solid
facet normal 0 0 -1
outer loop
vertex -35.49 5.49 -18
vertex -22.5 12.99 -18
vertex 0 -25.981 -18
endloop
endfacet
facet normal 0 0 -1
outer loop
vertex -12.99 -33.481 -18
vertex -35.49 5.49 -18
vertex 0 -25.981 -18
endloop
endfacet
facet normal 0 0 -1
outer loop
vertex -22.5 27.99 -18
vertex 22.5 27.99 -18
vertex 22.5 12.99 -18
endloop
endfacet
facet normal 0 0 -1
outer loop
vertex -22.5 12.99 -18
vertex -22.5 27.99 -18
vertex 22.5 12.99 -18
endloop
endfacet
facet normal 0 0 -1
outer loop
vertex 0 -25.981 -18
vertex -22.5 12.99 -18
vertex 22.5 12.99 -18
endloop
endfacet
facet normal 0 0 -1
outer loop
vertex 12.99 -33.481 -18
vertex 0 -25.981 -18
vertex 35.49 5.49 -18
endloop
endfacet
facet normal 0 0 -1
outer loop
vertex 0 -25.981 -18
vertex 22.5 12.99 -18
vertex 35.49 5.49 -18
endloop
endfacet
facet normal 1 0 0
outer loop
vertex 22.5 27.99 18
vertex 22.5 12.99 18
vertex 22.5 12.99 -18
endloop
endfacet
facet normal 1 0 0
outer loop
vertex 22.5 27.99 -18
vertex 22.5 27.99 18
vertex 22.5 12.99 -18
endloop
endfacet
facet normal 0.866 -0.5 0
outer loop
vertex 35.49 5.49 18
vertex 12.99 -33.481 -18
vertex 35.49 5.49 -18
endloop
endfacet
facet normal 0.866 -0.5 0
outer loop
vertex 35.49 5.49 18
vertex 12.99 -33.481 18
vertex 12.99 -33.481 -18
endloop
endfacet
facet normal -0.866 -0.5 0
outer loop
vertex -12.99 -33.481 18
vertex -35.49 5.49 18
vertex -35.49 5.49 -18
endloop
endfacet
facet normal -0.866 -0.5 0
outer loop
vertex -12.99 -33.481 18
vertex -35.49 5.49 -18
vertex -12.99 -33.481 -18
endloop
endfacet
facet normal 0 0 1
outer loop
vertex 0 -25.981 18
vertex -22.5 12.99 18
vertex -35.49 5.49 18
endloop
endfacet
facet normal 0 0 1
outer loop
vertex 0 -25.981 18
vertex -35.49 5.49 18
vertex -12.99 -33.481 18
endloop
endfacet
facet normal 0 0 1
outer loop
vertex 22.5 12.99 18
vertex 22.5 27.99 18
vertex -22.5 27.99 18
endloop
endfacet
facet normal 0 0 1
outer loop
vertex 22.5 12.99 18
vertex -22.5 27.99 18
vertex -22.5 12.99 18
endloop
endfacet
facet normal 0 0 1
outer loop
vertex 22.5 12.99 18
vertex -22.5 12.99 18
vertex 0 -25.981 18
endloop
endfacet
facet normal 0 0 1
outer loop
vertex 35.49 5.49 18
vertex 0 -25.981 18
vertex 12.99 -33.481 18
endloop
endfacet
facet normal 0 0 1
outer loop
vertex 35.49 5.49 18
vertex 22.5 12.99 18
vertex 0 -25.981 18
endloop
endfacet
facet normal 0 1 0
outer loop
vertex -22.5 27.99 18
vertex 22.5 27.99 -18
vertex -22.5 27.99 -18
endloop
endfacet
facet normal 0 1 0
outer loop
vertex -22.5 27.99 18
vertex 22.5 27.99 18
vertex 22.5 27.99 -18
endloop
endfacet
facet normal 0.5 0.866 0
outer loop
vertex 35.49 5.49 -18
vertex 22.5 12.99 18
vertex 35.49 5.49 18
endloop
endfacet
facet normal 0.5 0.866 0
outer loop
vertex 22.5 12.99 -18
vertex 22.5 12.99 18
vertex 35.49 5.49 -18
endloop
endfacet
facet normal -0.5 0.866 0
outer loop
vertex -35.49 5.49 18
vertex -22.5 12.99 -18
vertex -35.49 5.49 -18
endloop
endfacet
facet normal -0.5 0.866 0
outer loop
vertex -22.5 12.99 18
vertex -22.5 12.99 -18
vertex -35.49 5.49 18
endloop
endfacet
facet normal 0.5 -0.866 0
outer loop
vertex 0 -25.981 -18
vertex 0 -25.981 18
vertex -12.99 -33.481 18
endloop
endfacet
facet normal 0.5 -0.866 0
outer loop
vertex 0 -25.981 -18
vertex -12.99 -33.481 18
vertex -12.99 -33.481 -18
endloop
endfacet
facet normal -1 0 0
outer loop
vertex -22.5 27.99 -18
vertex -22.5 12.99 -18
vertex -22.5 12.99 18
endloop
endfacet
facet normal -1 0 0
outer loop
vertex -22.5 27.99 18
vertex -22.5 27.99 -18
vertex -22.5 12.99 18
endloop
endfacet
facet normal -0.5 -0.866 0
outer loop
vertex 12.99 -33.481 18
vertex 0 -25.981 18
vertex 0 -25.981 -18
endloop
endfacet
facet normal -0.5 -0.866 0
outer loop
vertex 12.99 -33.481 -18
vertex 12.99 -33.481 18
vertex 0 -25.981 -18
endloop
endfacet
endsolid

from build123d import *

# Parameters (mm, degrees)
F1_DEPTH = 18
F2_DEPTH = 15
F3_DEPTH = 15
F4_DEPTH = 15


# Not quite as in the source:
# - the program builds the solid bodies; features that only make, move or delete a surface that nothing else refers to are left out


with BuildPart() as f1:
    # F0 (on Top) → F1 (new body, symmetric)
    with BuildSketch(Plane.XY):
        Polygon((22.5, 12.9903810568), (-22.5, 12.9903810568), (0, -25.9807621135), align=None)
    extrude(amount=F1_DEPTH, both=True)

    # F2 (add): a face of the model
    f2_faces = [f1.faces().sort_by_distance(p)[0] for p in [
        (11.25, -6.4951905284, 0),
    ]]
    extrude(f2_faces, amount=F2_DEPTH)

    # F3 (add): a face of the model
    f3_faces = [f1.faces().sort_by_distance(p)[0] for p in [
        (0, 12.9903810568, 0),
    ]]
    extrude(f3_faces, amount=F3_DEPTH)

    # F4 (add): a face of the model
    f4_faces = [f1.faces().sort_by_distance(p)[0] for p in [
        (-11.25, -6.4951905284, 0),
    ]]
    extrude(f4_faces, amount=F4_DEPTH)


solid = f1.part
